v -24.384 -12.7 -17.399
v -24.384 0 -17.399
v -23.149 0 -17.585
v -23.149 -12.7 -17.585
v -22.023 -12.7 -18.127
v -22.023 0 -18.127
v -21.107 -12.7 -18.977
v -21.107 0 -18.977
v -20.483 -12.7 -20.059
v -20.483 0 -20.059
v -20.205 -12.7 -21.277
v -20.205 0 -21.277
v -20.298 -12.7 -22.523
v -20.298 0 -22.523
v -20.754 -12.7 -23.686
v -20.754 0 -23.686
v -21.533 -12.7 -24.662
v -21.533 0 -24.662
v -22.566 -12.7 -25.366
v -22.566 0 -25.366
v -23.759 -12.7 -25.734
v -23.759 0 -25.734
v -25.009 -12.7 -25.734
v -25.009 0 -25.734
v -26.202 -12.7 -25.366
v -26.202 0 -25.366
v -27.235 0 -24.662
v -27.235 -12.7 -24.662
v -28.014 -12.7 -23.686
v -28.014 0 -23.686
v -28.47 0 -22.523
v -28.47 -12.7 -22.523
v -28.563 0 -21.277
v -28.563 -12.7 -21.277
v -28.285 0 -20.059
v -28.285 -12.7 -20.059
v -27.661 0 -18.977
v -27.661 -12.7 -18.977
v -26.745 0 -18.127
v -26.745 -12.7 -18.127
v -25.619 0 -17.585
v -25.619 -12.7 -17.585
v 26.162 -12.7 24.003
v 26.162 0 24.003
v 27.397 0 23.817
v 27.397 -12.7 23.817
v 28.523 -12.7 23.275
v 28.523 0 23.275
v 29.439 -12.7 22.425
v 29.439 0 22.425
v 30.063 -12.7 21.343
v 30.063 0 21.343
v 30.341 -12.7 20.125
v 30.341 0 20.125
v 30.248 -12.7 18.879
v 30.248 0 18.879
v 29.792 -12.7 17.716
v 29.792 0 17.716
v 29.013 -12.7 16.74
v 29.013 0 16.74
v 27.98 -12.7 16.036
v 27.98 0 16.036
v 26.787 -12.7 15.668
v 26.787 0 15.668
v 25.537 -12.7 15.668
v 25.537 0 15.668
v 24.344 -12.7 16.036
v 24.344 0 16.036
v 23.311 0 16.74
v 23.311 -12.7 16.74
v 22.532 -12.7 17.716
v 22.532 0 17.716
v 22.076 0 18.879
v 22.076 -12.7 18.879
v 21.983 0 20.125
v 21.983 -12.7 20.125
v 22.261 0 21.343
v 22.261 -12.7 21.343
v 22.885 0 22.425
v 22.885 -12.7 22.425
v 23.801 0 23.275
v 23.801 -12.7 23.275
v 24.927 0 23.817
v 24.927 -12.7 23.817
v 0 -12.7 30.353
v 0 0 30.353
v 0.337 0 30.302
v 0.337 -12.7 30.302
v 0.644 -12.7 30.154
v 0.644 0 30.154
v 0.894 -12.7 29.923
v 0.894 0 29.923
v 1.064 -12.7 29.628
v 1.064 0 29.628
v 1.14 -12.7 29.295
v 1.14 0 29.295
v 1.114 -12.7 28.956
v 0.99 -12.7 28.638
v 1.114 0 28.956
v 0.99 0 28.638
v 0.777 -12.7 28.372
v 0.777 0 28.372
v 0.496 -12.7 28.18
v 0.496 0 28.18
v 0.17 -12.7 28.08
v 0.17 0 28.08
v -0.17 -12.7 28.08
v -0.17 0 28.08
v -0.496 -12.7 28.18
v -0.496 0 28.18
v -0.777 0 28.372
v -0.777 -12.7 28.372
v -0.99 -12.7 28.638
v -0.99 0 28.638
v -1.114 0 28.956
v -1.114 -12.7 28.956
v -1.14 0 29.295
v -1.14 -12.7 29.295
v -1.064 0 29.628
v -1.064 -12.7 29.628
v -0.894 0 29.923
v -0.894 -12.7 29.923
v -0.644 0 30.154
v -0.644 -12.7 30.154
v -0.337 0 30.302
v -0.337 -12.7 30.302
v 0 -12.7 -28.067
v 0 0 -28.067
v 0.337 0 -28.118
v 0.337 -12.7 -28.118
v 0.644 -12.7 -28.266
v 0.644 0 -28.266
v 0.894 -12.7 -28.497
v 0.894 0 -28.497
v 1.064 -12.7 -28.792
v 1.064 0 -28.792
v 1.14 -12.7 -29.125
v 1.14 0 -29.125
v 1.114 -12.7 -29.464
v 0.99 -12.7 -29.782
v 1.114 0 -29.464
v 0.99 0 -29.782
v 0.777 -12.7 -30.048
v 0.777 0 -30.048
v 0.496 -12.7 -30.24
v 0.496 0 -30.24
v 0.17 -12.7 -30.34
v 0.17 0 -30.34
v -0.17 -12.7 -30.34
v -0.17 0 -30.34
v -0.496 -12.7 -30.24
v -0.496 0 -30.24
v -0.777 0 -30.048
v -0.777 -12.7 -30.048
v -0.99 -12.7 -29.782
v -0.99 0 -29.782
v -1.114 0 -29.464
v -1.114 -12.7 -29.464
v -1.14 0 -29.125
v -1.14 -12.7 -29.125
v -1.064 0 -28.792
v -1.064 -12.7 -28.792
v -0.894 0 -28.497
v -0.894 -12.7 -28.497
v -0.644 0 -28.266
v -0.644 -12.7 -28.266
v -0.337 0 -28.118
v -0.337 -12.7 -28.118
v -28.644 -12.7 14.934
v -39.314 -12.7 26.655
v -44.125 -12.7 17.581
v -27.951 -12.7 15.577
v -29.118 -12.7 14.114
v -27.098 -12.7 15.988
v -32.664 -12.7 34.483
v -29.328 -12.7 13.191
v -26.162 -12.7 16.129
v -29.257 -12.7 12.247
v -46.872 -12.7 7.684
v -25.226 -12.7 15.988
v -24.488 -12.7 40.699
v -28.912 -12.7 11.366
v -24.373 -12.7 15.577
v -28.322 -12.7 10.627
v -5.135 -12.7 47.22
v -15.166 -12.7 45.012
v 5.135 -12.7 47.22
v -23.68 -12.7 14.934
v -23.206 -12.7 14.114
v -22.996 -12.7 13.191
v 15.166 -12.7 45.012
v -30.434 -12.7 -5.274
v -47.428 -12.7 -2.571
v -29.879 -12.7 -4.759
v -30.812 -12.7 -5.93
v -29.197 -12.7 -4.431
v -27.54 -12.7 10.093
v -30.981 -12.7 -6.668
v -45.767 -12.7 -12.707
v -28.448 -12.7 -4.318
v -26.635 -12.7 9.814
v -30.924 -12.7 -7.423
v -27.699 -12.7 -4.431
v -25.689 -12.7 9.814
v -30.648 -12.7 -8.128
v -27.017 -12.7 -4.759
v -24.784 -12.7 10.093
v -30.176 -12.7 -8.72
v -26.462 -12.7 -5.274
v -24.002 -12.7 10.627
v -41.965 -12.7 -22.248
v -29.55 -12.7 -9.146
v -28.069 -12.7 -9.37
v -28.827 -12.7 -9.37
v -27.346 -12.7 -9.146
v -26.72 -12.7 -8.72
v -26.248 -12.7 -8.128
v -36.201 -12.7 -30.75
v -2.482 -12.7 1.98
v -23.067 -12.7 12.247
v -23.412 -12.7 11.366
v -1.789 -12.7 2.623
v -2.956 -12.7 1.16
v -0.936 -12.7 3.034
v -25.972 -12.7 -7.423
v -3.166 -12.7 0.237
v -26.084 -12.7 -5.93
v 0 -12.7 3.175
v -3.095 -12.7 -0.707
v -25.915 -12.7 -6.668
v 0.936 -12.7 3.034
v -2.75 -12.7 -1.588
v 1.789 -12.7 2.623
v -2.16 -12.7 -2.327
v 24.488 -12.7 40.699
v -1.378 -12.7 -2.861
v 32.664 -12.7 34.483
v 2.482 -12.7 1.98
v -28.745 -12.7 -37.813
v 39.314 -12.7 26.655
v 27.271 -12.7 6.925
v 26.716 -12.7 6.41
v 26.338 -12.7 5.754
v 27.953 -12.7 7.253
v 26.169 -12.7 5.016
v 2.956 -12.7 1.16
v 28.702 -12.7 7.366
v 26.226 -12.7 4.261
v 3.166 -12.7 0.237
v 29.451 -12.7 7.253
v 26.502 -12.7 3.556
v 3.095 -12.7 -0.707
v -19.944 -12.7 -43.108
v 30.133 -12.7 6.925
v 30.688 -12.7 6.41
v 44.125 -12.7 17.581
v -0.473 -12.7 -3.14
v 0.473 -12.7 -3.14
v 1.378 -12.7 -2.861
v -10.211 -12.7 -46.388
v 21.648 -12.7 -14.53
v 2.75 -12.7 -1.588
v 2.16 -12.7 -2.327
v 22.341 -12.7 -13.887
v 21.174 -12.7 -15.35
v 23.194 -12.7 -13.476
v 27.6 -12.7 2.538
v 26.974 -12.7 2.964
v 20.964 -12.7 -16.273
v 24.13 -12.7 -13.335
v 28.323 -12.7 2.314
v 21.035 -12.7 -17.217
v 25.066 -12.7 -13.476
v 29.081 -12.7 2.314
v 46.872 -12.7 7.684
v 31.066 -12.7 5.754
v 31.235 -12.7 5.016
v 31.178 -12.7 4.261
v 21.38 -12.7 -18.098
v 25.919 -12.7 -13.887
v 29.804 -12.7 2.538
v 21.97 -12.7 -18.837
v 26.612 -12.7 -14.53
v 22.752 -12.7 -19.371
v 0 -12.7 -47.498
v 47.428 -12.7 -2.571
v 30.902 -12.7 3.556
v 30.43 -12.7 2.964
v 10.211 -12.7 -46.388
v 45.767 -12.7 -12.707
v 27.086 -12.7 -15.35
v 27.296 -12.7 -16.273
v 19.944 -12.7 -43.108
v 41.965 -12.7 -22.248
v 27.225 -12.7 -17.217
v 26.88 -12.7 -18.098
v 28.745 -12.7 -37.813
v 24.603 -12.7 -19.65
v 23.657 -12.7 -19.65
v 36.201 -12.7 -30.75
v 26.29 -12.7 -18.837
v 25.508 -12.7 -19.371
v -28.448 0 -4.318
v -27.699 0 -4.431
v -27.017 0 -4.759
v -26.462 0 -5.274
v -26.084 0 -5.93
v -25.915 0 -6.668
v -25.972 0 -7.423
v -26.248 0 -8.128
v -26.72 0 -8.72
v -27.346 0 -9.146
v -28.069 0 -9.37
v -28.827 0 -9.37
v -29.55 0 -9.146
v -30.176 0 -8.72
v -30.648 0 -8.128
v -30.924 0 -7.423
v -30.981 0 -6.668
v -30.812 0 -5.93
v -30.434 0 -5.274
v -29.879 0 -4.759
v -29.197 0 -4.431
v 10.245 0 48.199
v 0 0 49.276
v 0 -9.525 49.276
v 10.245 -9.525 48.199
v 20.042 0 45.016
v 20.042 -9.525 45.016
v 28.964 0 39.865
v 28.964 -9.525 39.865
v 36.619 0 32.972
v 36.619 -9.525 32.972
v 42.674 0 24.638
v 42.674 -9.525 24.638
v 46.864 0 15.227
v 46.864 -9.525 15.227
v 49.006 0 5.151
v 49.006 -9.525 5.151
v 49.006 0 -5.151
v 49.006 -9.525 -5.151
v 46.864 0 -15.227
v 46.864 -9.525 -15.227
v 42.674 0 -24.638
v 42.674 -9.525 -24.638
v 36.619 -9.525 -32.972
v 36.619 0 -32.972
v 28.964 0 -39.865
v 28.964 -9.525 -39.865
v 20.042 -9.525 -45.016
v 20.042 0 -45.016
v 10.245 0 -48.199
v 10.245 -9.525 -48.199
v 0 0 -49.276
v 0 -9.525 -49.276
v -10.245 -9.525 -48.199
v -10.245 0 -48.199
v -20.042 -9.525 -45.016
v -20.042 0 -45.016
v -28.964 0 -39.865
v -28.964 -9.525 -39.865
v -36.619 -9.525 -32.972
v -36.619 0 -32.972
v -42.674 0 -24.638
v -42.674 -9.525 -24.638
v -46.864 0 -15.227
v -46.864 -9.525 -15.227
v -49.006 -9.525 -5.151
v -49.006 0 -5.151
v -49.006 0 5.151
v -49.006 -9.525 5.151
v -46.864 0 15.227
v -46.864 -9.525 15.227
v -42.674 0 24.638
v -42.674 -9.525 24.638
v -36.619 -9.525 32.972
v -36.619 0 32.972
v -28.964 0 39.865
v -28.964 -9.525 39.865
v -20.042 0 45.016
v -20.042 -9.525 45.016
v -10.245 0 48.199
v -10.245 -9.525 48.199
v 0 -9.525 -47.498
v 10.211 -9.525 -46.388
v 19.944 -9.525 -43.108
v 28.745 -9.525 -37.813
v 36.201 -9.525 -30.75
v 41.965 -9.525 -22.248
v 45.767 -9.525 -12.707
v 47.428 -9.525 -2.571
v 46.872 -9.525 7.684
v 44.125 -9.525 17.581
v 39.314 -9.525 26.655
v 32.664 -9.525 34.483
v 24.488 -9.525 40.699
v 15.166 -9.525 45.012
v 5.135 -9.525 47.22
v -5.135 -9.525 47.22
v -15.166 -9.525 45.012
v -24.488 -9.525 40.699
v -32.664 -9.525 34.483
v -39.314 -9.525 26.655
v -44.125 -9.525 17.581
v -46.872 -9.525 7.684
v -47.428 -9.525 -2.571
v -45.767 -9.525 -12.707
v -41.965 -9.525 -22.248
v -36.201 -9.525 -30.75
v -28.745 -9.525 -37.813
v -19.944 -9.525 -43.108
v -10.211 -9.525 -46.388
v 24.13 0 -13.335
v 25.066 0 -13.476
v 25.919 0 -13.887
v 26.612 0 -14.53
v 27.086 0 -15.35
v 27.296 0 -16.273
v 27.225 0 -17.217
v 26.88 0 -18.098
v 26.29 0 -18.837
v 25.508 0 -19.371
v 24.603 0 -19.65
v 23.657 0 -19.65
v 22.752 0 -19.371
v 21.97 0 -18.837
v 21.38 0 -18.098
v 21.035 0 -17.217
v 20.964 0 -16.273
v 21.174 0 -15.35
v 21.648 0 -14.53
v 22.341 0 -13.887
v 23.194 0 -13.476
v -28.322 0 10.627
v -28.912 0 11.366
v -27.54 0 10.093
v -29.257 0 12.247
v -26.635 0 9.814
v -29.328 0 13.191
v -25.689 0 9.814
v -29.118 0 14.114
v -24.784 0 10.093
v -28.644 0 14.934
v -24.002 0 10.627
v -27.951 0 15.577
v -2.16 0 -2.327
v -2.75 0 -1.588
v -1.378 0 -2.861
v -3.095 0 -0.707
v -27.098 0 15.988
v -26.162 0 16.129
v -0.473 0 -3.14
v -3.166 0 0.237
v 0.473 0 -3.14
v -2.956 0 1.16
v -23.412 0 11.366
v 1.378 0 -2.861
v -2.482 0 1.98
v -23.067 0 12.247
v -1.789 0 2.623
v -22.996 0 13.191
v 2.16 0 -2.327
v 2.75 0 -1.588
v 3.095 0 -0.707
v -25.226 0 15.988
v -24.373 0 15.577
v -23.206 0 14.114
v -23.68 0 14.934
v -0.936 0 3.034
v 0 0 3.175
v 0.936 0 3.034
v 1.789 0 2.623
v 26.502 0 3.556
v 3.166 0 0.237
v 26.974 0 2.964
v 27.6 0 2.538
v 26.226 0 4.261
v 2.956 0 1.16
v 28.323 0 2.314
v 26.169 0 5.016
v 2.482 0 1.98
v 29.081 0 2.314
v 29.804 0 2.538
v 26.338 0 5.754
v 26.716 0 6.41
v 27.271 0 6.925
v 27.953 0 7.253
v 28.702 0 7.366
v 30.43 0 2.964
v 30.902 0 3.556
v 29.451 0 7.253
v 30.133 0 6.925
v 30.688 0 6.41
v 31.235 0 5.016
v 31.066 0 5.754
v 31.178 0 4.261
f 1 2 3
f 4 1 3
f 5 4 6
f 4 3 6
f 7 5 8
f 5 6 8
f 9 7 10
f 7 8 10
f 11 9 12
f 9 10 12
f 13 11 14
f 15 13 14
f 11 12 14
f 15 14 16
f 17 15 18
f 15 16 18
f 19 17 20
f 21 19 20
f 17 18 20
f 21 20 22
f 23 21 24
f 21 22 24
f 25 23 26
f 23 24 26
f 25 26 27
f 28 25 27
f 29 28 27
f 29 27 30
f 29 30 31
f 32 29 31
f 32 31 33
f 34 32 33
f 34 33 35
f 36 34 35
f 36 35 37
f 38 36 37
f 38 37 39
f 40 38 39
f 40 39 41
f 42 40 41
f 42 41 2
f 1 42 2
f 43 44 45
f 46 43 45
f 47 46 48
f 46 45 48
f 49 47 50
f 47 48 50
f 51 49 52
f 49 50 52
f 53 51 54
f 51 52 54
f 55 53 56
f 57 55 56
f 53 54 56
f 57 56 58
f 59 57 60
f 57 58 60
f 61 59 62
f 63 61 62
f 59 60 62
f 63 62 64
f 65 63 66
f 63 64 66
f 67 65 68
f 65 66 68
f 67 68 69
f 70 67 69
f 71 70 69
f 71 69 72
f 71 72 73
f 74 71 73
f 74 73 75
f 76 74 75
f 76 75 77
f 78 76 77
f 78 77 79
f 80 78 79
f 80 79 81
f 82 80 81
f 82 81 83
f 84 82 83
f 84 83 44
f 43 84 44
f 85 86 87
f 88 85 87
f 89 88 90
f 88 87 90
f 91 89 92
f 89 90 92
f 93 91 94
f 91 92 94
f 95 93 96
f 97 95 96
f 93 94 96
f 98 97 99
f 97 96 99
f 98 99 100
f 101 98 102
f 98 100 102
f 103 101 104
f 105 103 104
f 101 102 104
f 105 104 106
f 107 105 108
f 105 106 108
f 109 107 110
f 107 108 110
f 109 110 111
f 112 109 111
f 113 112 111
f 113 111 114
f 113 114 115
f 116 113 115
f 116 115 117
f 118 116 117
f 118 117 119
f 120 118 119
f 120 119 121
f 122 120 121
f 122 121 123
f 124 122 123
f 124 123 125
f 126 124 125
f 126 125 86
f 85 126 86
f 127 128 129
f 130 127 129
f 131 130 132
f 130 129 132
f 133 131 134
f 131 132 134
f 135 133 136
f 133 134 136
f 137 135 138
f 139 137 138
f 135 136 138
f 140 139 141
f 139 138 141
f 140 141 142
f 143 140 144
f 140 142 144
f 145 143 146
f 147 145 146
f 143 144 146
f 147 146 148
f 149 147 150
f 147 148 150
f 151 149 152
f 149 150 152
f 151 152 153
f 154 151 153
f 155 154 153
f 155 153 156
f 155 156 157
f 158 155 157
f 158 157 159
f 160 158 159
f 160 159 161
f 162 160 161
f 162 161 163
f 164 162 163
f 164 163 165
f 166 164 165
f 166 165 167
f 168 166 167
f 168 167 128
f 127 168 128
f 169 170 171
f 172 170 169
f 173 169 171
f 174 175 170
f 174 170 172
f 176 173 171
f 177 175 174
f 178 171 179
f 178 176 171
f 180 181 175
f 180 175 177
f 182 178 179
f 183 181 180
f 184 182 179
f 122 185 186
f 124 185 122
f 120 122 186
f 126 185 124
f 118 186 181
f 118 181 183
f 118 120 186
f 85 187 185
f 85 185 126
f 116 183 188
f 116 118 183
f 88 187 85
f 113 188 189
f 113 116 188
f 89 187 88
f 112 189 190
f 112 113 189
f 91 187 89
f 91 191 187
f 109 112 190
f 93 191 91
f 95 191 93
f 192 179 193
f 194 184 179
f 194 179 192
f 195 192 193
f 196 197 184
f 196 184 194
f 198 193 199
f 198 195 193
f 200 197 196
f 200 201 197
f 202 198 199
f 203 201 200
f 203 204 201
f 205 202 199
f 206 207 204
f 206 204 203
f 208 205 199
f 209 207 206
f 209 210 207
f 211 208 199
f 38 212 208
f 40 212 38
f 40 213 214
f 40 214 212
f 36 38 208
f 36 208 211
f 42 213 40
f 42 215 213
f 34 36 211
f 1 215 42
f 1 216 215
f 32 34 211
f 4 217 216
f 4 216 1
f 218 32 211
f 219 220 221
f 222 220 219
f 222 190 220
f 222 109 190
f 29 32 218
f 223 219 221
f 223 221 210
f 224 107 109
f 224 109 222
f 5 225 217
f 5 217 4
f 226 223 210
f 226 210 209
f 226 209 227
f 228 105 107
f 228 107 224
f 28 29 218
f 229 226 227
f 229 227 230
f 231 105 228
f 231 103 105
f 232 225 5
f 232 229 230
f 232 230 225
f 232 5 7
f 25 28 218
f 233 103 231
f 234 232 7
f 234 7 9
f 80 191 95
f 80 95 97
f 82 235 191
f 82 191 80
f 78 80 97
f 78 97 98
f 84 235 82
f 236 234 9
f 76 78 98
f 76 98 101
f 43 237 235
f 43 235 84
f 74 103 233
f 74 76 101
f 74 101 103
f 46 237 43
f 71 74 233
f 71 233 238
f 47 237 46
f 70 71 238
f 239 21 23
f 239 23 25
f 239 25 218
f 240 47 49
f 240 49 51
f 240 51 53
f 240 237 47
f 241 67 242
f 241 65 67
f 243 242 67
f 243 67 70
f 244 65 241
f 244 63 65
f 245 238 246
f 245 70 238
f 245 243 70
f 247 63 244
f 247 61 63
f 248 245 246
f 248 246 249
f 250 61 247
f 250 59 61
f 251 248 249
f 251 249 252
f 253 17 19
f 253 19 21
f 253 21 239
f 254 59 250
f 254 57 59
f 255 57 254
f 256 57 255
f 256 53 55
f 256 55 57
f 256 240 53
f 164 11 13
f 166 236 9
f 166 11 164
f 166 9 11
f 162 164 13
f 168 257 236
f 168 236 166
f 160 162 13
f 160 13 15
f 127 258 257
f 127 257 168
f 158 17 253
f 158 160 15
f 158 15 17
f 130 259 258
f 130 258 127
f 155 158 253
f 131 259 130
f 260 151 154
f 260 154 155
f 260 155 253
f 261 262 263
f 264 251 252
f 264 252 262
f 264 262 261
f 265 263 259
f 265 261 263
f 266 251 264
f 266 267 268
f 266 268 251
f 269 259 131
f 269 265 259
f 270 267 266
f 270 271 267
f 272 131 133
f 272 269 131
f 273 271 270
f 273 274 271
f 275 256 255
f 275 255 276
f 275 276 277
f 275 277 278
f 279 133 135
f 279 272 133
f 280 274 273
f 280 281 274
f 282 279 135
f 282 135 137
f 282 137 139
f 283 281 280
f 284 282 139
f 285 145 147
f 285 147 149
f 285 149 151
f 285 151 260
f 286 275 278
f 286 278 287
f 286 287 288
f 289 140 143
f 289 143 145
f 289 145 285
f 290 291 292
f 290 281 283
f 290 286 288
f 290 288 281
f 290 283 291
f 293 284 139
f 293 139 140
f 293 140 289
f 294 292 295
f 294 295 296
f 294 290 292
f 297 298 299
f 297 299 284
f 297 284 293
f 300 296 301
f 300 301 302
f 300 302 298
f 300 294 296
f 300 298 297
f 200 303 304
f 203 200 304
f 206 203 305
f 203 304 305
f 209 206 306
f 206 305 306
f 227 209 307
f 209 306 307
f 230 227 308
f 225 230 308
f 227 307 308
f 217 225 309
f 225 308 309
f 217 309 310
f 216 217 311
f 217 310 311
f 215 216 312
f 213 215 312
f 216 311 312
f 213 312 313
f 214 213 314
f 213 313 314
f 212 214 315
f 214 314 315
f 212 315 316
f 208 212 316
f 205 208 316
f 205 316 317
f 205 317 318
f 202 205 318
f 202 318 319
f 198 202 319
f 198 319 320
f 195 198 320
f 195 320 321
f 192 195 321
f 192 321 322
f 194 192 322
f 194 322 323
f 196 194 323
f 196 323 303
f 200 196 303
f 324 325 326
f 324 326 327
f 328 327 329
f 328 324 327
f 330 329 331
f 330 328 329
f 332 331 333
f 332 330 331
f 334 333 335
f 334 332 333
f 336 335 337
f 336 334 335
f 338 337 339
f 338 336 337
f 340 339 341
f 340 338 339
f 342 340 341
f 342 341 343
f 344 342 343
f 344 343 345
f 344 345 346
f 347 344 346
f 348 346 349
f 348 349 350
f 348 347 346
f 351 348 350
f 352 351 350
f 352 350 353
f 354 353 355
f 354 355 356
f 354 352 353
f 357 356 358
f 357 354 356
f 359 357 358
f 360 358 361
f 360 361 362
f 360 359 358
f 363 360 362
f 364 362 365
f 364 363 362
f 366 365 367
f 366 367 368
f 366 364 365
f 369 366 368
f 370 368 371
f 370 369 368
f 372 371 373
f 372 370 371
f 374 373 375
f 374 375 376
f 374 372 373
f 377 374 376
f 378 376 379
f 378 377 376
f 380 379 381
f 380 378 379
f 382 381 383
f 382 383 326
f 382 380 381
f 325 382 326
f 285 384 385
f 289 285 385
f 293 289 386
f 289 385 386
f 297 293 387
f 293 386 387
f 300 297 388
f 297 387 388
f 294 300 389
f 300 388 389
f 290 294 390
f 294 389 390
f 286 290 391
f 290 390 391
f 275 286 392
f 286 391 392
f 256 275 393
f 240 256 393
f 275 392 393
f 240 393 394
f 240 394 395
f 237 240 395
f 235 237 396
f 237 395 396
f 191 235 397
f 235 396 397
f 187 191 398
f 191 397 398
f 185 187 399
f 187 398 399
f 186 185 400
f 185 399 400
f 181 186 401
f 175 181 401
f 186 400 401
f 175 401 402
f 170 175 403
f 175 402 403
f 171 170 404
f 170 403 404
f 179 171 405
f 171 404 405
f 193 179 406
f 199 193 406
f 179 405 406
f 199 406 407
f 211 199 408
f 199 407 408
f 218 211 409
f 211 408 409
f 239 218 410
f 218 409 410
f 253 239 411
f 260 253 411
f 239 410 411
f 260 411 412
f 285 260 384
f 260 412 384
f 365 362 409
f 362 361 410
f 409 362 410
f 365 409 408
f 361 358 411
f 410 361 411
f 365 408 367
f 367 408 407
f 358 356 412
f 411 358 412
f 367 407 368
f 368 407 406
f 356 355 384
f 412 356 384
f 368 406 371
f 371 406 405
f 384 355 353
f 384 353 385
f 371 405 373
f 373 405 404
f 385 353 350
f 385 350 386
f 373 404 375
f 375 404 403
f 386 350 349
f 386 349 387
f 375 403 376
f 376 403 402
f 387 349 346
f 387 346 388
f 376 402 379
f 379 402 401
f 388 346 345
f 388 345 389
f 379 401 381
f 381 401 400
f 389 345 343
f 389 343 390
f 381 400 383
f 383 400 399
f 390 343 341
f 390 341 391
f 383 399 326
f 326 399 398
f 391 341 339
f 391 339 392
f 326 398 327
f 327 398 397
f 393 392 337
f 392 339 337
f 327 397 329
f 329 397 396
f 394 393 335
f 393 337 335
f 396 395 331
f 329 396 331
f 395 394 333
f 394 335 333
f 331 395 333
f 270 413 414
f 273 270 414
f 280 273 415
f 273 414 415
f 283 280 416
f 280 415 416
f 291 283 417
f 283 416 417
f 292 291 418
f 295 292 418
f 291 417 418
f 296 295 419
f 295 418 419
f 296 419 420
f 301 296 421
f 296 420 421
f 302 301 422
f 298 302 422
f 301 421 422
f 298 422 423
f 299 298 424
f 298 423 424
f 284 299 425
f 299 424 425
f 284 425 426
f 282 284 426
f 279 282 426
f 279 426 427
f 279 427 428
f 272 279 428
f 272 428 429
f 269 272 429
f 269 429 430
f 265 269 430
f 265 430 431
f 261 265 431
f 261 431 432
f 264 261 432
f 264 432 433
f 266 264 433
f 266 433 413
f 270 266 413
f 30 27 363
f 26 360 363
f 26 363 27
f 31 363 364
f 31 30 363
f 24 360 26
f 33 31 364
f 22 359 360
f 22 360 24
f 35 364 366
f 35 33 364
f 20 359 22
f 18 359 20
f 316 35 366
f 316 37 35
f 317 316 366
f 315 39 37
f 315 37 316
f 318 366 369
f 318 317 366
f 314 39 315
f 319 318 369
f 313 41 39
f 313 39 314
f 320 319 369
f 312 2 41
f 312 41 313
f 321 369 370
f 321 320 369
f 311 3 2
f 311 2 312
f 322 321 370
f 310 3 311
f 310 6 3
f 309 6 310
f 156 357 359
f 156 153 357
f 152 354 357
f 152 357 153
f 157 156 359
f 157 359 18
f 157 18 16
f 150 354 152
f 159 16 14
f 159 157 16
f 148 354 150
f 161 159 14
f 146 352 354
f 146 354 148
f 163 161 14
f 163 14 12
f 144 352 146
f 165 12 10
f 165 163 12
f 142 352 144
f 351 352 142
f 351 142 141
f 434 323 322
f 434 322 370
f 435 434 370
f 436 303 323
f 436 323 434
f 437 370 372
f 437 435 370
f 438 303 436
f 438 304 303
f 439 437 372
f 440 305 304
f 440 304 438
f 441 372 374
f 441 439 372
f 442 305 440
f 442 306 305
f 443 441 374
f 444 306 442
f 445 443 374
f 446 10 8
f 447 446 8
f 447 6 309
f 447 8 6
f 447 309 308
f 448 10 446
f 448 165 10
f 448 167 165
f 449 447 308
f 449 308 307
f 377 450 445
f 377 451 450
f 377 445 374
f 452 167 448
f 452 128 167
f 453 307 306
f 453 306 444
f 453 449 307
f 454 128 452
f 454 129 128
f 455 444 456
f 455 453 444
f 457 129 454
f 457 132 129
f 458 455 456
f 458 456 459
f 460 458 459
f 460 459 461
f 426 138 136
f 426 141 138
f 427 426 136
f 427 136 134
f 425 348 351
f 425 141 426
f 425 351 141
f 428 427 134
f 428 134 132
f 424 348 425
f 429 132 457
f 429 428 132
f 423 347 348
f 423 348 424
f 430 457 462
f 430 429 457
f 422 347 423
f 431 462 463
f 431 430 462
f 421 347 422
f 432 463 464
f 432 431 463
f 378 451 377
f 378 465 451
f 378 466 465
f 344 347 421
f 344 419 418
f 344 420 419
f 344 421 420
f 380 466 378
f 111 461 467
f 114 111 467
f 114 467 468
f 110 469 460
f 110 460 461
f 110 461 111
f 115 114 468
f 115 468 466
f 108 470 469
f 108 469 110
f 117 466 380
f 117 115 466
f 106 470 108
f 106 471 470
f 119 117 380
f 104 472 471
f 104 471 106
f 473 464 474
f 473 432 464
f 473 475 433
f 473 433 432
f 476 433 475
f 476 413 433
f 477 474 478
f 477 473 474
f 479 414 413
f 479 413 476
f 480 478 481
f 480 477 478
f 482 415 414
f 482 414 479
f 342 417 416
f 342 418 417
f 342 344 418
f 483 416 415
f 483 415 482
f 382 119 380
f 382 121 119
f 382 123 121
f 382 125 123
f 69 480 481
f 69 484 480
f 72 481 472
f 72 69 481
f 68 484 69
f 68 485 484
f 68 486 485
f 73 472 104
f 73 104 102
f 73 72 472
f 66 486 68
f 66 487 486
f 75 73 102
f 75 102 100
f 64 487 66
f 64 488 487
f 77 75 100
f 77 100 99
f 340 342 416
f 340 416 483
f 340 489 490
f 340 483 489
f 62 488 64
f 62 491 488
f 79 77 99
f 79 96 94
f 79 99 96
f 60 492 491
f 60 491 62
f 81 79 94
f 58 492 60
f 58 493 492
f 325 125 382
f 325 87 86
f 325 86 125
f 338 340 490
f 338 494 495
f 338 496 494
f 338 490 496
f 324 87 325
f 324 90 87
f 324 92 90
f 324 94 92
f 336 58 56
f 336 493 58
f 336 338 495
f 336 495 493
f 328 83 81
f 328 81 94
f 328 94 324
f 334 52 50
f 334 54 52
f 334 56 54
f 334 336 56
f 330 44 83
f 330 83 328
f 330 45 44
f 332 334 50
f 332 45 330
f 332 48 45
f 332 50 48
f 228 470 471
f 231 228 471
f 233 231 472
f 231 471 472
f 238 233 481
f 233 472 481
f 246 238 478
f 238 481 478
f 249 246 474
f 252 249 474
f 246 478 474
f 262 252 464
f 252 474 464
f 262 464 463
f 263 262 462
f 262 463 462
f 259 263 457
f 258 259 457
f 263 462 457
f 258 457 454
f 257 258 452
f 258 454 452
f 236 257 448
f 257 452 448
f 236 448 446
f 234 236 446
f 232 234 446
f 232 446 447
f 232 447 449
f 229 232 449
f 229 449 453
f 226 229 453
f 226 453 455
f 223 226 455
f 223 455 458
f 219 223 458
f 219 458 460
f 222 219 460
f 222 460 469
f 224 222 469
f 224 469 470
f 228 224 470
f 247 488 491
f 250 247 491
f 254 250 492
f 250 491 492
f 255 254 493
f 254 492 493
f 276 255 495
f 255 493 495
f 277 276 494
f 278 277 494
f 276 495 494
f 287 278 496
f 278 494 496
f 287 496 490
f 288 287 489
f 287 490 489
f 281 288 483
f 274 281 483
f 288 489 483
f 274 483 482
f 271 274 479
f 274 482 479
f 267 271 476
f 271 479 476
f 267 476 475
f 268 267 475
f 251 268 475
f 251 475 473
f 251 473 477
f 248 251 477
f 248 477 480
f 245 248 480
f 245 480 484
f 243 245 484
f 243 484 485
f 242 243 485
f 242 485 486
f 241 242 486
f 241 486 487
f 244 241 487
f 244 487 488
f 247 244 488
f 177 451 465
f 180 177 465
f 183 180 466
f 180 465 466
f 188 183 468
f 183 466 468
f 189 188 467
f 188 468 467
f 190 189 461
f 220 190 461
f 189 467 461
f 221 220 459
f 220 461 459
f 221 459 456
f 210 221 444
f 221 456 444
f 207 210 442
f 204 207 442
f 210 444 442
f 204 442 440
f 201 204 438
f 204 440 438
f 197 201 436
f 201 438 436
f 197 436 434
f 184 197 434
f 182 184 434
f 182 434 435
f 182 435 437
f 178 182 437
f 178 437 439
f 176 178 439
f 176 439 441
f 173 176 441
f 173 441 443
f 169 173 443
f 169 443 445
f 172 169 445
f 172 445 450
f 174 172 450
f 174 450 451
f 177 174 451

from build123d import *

# Parameters (mm, degrees)
SKETCH1_R           = 49.276
BOSS_EXTRUDE1_DEPTH = 9.525
SKETCH2_R           = 47.498
BOSS_EXTRUDE2_DEPTH = 3.175
SKETCH5_R           = 3.175
SKETCH5_R_2         = 1.143
SKETCH5_R_3         = 4.191
SKETCH5_R_4         = 2.54
CUT_EXTRUDE1_DEPTH  = 71.834584434


with BuildPart() as part:
    # Sketch1 → Boss-Extrude1 (new body)
    with BuildSketch(Plane(origin=(0, 0, 0), x_dir=(1, 0, 0), z_dir=(0, 1, 0))):
        with Locations(Location((0, 0, 0), (0, 0, 270))):
            Circle(SKETCH1_R)
    extrude(amount=-BOSS_EXTRUDE1_DEPTH)

    # Sketch2 → Boss-Extrude2 (add)
    with BuildSketch(Plane.XZ.offset(9.525)):
        with Locations(Location((0, 0, 0), (0, 0, 270))):
            Circle(SKETCH2_R)
    extrude(amount=BOSS_EXTRUDE2_DEPTH)

    # Sketch5 → Cut-Extrude1 (cut, through all)
    with BuildSketch(Plane(origin=(0, 0, 0), x_dir=(1, 0, 0), z_dir=(0, 1, 0))):
        with Locations(Location((0, 0, 0), (0, 0, 270))):
            Circle(SKETCH5_R)
        with Locations(Location((0, 29.21, 0), (0, 0, 270))):
            Circle(SKETCH5_R_2)
        with Locations(Location((0, -29.21, 0), (0, 0, 270))):
            Circle(SKETCH5_R_2)
        with Locations(Location((-24.384, 21.59, 0), (0, 0, 270))):
            Circle(SKETCH5_R_3)
        with Locations(Location((-28.448, 6.858, 0), (0, 0, 270))):
            Circle(SKETCH5_R_4)
        with Locations(Location((-26.162, -12.954, 0), (0, 0, 270))):
            Circle(SKETCH5_R)
        with Locations(Location((26.162, -19.812, 0), (0, 0, 270))):
            Circle(SKETCH5_R_3)
        with Locations(Location((28.702, -4.826, 0), (0, 0, 270))):
            Circle(SKETCH5_R_4)
        with Locations(Location((24.13, 16.51, 0), (0, 0, 270))):
            Circle(SKETCH5_R)
    extrude(amount=-CUT_EXTRUDE1_DEPTH, mode=Mode.SUBTRACT)


solid = part.part
